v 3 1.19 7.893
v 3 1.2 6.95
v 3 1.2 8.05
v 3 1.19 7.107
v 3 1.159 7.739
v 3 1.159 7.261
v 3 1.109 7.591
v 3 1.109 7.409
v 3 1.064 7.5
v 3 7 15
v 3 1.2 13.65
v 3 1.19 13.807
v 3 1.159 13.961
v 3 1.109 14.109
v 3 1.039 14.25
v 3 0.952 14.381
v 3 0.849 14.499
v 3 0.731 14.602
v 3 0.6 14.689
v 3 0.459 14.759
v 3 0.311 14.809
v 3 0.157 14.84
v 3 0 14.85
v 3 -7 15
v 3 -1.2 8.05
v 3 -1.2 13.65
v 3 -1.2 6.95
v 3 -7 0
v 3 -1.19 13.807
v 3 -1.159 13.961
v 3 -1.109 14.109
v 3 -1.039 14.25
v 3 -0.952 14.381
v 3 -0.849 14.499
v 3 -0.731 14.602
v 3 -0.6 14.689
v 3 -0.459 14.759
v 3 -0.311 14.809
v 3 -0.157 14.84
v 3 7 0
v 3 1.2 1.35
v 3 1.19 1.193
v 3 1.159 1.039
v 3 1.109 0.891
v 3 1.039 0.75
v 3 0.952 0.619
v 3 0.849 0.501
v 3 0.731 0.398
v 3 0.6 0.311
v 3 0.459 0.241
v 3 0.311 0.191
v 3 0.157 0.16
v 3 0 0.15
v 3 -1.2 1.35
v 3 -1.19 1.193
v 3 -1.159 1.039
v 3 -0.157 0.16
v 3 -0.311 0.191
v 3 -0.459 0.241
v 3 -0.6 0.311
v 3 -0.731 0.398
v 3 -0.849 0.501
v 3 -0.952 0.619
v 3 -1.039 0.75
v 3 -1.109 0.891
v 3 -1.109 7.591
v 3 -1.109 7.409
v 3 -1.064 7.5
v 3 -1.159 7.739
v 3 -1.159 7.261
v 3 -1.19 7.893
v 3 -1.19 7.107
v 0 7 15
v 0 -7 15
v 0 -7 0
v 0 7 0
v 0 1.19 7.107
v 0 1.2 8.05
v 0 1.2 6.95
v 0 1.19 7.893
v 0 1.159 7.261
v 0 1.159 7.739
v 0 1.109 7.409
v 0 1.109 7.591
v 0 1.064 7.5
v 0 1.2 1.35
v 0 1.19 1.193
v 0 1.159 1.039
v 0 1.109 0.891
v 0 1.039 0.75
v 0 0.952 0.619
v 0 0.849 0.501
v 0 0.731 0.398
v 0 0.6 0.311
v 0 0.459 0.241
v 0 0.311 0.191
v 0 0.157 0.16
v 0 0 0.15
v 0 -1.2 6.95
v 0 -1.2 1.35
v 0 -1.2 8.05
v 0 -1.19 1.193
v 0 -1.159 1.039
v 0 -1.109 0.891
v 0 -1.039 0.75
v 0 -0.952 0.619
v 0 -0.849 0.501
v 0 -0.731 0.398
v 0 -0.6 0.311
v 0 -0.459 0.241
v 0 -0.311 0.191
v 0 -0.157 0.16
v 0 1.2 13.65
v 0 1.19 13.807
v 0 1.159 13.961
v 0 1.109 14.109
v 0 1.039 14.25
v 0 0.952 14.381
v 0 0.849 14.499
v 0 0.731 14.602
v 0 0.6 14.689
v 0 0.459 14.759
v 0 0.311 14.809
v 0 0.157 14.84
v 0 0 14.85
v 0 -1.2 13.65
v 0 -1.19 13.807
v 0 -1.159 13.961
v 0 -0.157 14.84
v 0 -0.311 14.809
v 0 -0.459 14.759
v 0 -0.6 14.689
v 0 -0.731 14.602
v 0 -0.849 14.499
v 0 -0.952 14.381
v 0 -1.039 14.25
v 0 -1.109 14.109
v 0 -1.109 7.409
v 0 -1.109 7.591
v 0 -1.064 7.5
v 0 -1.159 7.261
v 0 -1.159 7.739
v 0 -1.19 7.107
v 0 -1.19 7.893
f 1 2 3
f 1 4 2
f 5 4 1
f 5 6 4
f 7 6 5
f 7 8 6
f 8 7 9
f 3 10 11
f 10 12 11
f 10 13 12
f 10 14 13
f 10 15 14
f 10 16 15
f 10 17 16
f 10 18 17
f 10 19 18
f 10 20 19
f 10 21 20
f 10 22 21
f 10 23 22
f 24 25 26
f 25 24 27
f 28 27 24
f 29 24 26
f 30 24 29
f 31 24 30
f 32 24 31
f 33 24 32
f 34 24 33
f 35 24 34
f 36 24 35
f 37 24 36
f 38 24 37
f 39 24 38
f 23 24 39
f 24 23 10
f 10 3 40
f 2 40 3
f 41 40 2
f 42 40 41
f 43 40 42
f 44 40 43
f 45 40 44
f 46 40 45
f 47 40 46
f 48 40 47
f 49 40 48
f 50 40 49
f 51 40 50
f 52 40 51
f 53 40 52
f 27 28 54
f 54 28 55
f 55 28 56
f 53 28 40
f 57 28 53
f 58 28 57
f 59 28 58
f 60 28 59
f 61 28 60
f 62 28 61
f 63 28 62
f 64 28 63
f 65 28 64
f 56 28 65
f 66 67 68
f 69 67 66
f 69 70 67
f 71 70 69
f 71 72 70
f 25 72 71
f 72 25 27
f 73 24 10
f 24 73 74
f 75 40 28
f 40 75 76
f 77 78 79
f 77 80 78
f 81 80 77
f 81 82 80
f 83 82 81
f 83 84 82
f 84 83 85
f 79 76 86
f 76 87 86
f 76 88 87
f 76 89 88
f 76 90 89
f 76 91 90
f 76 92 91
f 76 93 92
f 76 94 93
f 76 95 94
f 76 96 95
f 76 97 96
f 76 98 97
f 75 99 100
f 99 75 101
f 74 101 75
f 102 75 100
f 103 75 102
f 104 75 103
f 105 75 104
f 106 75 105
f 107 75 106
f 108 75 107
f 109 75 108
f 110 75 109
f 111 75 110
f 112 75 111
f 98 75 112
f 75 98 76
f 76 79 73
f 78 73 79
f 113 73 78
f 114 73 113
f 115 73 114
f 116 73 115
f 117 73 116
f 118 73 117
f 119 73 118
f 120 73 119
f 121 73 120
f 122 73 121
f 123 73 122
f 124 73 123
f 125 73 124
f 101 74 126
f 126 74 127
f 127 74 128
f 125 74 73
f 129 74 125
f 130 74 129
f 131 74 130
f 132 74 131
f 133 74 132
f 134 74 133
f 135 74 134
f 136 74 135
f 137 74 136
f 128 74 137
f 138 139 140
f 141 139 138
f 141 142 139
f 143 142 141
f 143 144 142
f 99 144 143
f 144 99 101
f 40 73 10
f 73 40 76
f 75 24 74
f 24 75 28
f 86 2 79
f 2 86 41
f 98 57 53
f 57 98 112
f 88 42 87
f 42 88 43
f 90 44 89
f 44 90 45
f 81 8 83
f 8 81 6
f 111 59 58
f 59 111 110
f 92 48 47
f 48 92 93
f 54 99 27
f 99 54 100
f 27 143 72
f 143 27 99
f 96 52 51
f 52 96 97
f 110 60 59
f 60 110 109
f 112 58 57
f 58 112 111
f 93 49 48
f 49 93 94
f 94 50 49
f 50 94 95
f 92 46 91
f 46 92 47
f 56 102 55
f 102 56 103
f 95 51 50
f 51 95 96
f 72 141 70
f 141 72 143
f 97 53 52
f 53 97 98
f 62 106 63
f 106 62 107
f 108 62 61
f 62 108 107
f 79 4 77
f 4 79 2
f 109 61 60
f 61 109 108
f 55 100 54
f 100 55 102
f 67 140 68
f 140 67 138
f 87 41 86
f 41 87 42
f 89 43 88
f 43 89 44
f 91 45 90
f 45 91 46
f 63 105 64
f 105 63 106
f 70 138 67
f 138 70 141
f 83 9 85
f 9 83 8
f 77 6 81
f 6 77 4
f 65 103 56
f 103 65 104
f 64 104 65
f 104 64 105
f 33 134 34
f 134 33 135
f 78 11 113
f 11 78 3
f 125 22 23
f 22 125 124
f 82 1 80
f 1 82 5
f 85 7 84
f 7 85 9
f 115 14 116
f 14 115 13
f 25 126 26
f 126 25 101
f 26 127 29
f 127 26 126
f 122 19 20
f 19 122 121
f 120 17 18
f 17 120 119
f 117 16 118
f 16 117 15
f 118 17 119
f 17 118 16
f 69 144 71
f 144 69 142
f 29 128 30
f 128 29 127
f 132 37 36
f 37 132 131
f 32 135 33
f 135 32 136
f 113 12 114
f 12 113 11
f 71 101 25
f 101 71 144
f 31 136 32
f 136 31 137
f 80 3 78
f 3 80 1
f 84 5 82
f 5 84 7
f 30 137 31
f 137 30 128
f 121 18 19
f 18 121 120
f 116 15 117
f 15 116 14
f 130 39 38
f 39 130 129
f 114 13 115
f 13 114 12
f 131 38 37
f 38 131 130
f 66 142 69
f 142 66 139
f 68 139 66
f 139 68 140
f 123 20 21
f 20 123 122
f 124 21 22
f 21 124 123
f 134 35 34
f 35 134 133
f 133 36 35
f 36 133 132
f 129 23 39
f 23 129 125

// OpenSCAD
// Pattern: individual wall-integrated zip-tie clip.
// The slot cuts are applied only to the raised internal clip body.

$fn = 48;

wall_tie_clip_width_y = 14;
wall_tie_clip_height_z = 15;
wall_tie_clip_projection = 3;
wall_tie_slot_width_y = 8;
wall_tie_slot_height_z = 2.7;
wall_tie_center_bridge_height = 4;
wall_tie_slot_corner_radius = 1.2;

module rounded_slot_2d(length, height, radius = 0) {
    r = (radius > 0) ? radius : height / 2;
    hull() {
        translate([-length / 2 + r, 0])
            circle(r = r);
        translate([ length / 2 - r, 0])
            circle(r = r);
    }
}

module rounded_slot_cut(depth, length_y, height_z, zc) {
    translate([-0.05, 0, zc])
        rotate([0, 90, 0])
            linear_extrude(height = depth)
                rounded_slot_2d(length_y, height_z, wall_tie_slot_corner_radius);
}

module clip_pad() {
    translate([wall_tie_clip_projection / 2, 0, wall_tie_clip_height_z / 2])
        cube([
            wall_tie_clip_projection,
            wall_tie_clip_width_y,
            wall_tie_clip_height_z
        ], center = true);
}

module wall_tie_clip() {
    stack_h = 2 * wall_tie_slot_height_z + wall_tie_center_bridge_height;
    z0 = (wall_tie_clip_height_z - stack_h) / 2;
    lower_zc = z0 + wall_tie_slot_height_z / 2;
    upper_zc = z0 + wall_tie_slot_height_z + wall_tie_center_bridge_height + wall_tie_slot_height_z / 2;

    difference() {
        clip_pad();
        rounded_slot_cut(wall_tie_clip_projection + 0.25, wall_tie_slot_width_y, wall_tie_slot_height_z, lower_zc);
        rounded_slot_cut(wall_tie_clip_projection + 0.25, wall_tie_slot_width_y, wall_tie_slot_height_z, upper_zc);
    }
}

wall_tie_clip();
